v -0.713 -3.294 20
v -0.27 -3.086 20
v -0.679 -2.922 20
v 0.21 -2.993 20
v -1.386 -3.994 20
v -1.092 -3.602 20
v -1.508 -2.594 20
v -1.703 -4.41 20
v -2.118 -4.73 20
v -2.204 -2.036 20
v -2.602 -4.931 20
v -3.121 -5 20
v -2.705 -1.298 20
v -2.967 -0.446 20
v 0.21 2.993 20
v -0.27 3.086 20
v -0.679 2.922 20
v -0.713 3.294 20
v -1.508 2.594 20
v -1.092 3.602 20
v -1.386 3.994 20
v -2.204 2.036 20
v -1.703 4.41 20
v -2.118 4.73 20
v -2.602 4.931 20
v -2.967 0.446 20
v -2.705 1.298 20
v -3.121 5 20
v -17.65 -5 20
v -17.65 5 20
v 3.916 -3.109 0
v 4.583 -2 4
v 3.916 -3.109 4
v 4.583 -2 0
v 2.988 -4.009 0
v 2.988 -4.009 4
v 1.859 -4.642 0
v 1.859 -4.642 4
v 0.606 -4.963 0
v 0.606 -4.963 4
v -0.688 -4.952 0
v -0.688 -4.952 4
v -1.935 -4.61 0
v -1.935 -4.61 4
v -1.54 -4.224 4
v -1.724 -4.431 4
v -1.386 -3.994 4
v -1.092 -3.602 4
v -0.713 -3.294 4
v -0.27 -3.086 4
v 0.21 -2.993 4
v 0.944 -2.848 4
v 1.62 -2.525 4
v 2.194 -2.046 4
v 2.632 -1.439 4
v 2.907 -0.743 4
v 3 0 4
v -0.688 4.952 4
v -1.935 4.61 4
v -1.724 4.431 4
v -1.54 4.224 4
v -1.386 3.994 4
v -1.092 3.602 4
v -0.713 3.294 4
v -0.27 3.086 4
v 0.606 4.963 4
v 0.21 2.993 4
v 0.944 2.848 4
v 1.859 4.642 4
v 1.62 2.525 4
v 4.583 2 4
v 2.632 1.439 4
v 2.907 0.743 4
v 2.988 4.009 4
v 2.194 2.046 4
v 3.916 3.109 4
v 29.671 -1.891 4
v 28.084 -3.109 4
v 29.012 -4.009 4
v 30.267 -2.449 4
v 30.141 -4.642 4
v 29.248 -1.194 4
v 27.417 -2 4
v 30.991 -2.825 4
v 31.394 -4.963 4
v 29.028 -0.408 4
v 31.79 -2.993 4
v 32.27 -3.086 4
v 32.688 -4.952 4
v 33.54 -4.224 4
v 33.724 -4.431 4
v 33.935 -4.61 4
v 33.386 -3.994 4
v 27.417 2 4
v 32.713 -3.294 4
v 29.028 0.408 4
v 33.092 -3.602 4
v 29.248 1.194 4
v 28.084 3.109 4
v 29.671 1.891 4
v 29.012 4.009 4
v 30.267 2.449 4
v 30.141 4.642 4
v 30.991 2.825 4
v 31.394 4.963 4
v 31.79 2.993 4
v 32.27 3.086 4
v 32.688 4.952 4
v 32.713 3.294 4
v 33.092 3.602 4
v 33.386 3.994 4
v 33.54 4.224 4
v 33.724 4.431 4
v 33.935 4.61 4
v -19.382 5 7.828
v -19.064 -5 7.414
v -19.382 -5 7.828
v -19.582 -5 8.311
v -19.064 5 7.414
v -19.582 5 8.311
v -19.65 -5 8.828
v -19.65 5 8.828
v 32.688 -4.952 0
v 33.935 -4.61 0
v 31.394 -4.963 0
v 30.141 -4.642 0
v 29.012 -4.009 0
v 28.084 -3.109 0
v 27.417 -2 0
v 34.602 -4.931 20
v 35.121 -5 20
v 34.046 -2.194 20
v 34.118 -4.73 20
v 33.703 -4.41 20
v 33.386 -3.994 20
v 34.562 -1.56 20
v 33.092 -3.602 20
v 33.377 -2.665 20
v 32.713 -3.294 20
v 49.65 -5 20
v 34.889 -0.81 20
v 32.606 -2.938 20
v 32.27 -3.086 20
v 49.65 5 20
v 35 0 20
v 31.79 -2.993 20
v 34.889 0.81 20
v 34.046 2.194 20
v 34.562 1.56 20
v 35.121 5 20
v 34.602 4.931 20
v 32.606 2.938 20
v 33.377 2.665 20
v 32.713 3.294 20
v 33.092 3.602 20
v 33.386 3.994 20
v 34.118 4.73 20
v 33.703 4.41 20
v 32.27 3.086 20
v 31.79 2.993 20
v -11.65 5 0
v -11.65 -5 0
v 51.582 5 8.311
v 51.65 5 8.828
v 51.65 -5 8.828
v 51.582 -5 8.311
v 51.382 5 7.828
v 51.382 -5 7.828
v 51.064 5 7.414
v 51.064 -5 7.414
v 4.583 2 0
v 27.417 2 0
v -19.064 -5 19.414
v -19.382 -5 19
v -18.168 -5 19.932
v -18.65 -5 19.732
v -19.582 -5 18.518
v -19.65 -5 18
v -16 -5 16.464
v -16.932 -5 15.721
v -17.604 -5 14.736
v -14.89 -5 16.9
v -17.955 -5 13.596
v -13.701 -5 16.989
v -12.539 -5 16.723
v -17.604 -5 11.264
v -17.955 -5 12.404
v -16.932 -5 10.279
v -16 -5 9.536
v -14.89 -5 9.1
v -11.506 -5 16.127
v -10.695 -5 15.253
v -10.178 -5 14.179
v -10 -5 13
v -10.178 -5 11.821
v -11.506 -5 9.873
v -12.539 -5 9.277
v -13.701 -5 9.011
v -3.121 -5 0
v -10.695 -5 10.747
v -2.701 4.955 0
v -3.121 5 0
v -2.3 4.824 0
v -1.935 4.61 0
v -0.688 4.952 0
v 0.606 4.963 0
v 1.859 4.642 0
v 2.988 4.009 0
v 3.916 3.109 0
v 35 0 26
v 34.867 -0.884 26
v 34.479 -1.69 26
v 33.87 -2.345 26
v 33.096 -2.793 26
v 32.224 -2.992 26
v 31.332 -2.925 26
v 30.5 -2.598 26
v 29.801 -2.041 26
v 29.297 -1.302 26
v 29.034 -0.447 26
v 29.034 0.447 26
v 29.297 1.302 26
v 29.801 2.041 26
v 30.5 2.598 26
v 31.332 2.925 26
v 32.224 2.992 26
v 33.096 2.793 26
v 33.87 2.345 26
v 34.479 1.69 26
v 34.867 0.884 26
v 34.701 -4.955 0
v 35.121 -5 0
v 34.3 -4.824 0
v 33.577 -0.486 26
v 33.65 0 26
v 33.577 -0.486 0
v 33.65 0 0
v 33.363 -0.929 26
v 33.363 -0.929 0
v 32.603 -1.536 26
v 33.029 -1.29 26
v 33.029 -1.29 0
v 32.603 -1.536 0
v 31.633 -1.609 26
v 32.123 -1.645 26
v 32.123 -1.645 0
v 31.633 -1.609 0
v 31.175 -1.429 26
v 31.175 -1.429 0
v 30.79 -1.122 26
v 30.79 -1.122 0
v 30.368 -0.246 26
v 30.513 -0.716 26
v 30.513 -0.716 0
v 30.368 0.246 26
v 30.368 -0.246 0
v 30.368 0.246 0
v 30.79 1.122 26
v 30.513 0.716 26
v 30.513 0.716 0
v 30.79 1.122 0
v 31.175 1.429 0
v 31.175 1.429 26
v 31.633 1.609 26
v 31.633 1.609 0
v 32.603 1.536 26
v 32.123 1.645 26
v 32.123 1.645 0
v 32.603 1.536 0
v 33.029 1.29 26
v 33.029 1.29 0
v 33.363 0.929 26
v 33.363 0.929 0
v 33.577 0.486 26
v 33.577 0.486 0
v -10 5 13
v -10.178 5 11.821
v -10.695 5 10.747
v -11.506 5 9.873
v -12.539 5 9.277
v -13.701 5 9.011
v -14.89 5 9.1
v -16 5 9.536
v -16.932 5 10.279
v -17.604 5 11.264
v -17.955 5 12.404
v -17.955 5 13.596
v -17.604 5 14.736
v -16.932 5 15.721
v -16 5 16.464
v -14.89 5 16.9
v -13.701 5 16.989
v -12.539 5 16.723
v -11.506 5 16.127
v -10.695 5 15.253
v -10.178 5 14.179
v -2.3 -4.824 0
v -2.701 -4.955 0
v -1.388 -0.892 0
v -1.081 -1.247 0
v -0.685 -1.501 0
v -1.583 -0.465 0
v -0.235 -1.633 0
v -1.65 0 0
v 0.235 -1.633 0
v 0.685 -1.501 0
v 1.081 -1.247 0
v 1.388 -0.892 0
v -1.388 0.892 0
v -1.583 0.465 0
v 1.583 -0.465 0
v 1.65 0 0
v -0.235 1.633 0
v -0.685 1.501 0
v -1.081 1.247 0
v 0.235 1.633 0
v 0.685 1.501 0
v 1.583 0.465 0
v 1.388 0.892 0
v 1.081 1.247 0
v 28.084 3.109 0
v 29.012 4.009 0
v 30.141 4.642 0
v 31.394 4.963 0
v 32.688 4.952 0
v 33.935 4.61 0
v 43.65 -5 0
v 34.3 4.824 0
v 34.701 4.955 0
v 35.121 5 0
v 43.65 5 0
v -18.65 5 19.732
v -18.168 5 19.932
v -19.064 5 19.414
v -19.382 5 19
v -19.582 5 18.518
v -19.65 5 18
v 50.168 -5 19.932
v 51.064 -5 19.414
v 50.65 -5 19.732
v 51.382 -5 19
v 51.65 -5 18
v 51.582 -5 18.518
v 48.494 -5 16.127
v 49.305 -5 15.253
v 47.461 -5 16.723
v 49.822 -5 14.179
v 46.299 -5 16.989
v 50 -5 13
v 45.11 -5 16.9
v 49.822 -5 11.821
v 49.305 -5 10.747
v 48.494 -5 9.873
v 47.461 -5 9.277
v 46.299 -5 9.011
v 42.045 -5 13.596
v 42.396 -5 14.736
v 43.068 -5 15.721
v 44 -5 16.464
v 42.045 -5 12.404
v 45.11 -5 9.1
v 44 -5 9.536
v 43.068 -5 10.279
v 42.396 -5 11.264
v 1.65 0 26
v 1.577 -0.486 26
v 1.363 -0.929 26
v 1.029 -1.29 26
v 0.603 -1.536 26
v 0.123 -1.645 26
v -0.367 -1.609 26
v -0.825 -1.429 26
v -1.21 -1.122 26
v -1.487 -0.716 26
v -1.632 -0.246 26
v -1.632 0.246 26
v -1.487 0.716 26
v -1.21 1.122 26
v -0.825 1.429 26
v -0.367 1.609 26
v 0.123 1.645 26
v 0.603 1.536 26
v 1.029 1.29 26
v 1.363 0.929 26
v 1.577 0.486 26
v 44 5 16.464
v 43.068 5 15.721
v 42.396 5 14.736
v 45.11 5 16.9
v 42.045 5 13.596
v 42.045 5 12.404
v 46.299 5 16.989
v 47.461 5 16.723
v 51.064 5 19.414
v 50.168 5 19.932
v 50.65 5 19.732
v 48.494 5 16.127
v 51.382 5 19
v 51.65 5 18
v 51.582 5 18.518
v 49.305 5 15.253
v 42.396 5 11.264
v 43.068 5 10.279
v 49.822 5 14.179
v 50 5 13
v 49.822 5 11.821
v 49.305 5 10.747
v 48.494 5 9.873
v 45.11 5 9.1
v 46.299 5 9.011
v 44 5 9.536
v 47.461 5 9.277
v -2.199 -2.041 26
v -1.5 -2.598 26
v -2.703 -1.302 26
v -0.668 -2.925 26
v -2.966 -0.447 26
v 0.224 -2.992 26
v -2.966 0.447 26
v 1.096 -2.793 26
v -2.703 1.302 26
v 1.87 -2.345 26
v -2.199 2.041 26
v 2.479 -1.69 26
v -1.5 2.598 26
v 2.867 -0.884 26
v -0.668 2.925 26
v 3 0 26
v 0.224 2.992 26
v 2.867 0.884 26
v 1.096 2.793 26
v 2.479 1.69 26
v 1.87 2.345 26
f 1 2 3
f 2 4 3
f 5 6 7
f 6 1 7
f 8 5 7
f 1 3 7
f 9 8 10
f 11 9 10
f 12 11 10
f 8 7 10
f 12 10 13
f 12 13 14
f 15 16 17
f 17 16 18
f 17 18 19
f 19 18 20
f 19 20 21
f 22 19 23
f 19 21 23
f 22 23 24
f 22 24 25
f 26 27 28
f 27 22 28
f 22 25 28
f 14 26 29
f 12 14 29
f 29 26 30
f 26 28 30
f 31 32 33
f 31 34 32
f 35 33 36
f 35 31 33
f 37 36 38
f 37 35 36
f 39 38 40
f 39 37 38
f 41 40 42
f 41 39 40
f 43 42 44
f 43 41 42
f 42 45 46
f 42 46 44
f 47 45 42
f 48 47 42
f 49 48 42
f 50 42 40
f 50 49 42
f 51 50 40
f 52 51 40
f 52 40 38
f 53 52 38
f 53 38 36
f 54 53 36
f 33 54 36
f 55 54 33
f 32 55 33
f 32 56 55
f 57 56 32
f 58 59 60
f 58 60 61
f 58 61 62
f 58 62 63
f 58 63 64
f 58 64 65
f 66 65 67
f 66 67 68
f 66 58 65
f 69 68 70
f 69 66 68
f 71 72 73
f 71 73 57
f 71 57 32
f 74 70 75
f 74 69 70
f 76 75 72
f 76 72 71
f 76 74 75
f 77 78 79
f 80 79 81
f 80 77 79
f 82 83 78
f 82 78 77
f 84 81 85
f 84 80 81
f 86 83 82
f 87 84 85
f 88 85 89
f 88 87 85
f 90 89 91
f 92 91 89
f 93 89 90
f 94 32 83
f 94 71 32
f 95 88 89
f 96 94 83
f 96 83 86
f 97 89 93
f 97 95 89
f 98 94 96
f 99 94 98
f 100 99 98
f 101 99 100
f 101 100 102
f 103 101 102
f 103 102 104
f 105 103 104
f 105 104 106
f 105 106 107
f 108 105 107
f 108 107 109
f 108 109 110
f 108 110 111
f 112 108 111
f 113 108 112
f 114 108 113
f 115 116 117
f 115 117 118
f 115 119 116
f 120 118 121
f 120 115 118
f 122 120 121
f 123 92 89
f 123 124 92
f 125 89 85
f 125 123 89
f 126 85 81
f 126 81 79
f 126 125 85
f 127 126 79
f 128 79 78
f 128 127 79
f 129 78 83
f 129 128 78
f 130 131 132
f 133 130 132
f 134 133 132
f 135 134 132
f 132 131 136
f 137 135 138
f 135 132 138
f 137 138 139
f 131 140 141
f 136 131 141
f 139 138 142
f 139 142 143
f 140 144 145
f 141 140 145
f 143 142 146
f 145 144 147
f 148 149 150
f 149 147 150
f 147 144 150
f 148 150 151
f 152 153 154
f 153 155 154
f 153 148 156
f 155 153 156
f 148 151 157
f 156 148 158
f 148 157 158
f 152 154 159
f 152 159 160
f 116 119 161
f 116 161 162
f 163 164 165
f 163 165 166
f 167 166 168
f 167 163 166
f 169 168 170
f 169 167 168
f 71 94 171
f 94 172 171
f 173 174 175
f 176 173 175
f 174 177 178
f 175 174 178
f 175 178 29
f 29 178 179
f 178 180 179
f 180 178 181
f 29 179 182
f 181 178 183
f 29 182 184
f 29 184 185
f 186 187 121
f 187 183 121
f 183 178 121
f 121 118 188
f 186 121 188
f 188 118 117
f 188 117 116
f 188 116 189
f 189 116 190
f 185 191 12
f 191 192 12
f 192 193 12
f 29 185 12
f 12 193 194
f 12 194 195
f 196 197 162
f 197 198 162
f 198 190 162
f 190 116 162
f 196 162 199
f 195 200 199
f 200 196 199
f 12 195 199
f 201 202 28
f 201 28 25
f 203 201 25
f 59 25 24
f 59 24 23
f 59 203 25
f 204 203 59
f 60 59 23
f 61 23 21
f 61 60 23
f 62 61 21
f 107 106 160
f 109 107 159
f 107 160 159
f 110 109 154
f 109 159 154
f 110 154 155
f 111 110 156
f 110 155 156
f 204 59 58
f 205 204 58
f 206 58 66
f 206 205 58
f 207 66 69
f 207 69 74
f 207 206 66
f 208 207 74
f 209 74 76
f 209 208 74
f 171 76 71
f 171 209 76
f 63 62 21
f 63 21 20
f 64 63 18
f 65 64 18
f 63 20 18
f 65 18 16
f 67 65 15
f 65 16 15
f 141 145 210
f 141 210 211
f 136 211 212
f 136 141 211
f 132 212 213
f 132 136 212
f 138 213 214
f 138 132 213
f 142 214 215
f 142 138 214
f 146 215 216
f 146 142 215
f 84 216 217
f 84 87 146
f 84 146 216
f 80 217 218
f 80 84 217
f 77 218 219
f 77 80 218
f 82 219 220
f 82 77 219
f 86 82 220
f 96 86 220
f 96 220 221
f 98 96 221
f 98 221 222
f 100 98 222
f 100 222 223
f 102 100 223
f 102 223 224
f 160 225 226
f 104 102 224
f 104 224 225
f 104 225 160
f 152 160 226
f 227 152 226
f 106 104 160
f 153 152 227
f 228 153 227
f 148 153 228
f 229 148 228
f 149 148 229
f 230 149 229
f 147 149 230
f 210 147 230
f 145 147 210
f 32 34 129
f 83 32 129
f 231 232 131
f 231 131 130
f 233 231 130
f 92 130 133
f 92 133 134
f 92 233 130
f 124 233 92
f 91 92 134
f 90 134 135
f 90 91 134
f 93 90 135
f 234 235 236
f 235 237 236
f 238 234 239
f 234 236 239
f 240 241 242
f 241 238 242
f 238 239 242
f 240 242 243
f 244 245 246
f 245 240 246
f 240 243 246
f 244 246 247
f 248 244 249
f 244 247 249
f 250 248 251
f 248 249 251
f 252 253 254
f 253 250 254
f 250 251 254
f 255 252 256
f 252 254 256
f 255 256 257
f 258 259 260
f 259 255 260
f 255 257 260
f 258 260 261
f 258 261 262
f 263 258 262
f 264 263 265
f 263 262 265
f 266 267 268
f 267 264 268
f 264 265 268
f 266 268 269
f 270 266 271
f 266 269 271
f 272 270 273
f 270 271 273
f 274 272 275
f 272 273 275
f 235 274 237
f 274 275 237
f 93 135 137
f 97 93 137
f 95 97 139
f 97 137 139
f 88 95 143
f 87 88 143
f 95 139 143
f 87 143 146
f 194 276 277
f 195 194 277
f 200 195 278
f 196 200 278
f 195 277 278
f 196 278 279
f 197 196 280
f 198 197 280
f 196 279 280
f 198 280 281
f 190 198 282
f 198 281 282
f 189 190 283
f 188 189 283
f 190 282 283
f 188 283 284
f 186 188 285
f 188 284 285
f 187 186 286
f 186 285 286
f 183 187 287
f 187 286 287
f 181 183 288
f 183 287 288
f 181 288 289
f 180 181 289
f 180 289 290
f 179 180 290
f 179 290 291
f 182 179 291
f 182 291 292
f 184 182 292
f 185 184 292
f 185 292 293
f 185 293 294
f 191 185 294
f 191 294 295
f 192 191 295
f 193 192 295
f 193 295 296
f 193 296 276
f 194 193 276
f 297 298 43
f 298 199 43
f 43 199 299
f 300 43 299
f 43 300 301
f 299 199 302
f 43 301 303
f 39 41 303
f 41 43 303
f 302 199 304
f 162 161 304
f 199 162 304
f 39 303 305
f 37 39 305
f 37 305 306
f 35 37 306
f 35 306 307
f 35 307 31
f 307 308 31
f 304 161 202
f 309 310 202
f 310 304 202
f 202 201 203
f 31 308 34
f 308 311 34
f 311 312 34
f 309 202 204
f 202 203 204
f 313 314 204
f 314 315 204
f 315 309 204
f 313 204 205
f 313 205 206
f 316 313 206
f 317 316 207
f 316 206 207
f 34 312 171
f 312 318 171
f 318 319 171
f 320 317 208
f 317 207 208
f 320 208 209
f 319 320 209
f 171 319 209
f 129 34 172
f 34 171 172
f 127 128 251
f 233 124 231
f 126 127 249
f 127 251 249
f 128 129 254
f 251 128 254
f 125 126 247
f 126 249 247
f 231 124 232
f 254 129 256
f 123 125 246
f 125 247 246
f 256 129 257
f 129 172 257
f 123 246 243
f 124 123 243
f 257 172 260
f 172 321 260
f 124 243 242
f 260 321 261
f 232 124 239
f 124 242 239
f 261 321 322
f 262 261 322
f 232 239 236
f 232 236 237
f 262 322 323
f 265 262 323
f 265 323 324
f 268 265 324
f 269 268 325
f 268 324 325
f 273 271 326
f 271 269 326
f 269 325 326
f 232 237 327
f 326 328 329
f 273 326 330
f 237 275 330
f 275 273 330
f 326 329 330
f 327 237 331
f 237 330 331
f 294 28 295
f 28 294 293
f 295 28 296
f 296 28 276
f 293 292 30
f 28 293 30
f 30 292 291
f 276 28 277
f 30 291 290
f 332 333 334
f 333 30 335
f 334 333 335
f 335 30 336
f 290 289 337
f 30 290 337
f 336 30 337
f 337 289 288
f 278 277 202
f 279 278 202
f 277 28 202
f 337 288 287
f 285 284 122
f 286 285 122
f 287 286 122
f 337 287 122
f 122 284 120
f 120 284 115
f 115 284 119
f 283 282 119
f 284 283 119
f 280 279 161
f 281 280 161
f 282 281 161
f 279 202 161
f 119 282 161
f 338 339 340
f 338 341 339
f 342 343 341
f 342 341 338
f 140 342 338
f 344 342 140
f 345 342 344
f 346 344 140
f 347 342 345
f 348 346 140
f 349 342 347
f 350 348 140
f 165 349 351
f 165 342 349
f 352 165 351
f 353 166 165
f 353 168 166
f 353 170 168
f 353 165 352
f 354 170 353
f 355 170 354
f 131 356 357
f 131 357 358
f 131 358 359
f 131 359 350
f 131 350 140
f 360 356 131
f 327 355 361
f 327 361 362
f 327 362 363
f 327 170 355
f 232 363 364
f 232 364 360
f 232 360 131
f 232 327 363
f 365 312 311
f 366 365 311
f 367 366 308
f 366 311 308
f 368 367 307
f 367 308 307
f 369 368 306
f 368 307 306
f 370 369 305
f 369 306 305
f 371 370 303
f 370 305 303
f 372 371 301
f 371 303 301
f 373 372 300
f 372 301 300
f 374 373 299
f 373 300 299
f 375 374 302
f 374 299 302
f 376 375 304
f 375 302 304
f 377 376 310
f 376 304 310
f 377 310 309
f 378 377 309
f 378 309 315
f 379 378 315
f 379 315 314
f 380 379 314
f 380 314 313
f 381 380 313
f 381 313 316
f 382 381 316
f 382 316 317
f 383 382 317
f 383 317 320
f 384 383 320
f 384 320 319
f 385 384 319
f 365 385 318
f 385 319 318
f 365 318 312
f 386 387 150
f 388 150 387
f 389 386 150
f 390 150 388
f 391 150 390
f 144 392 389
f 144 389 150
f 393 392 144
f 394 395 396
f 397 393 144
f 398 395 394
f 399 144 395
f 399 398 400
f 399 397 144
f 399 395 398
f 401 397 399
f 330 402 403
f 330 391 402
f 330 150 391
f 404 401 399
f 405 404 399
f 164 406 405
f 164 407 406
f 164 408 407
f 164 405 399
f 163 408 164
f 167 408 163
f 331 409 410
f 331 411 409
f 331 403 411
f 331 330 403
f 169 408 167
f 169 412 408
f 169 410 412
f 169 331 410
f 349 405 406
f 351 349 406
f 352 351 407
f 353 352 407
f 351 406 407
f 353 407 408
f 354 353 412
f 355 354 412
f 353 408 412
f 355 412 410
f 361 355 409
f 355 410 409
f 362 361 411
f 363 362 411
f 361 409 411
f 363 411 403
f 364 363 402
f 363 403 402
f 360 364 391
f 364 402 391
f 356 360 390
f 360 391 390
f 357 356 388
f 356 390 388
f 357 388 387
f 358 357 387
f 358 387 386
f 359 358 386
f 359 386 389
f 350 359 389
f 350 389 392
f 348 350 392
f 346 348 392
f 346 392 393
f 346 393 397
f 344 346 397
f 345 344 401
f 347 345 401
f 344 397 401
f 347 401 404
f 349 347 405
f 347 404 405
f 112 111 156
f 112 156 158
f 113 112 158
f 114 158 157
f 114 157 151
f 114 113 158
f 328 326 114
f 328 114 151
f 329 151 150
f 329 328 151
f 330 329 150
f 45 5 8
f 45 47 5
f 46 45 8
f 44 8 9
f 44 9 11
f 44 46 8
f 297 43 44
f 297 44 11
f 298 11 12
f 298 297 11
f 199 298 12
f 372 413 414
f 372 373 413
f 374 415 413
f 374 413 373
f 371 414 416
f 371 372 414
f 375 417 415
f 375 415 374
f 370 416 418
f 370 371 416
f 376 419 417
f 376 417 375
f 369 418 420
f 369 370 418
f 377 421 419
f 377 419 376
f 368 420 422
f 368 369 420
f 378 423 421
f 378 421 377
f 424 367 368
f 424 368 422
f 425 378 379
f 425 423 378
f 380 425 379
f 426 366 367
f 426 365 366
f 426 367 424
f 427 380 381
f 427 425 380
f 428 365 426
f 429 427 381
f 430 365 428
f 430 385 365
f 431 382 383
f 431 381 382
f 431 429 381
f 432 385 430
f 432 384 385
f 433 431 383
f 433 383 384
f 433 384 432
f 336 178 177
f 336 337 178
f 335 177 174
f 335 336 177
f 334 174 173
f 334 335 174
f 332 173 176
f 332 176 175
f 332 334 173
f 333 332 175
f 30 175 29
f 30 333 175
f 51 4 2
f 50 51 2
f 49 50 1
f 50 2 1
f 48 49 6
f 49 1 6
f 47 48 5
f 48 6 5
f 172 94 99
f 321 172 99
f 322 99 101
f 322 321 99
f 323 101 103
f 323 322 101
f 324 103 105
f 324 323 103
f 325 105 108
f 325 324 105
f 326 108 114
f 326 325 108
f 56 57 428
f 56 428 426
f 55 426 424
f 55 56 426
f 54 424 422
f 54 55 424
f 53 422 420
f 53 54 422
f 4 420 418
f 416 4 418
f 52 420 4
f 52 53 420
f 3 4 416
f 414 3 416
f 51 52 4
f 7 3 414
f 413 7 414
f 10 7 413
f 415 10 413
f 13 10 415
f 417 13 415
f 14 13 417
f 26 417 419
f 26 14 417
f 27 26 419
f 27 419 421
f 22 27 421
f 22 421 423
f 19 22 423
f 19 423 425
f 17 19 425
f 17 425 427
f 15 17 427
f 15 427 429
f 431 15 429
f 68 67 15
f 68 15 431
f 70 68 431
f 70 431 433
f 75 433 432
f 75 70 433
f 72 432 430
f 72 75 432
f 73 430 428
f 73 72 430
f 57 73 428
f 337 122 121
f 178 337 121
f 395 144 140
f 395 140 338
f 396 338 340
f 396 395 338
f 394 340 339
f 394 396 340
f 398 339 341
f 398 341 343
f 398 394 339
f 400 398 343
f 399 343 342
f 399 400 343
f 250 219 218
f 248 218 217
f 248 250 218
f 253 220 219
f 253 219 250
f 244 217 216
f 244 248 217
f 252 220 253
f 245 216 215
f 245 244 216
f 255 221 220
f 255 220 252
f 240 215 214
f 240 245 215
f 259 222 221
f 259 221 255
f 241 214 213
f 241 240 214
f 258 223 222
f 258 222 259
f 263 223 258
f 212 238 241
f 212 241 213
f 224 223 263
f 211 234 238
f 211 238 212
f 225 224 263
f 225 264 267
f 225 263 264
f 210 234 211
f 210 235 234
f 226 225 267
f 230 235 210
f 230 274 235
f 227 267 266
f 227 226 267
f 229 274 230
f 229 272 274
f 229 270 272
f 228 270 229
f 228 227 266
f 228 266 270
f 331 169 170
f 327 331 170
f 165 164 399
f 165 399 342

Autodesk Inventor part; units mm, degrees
ref_plane "YZ Plane" through (0, 0, 0) normal (1, 0, 0) x (0, 1, 0)
ref_plane "XZ Plane" through (0, 0, 0) normal (0, 1, 0) x (-1, 0, 0)
ref_plane "XY Plane" through (0, 0, 0) normal (0, 0, 1) x (1, 0, 0)
sketch "Sketch1" plane through (0, 0, 0) normal (0, 0, 1) x (1, 0, 0)
  circle A0 centre (0, 0) radius 1.65
  circle A1 centre (0, 0) radius 3
  circle A2 centre (32, 0) radius 1.65
  circle A3 centre (32, 0) radius 3
  dimension "d0" = 3.3
  dimension "d1" = 6
  dimension "d22" = 32
extrude "Extrusion1" add sketch "Sketch1" along normal blind 26
sketch "Sketch2" plane through (0, 0, 0) normal (0, 0, -1) x (-1, 0, 0)
  circle A0 centre (0, 0) radius 3 projected
  circle A1 centre (0, 0) radius 5
  circle A2 centre (-32, 0) radius 1.65 projected
  circle A3 centre (-32, 0) radius 5
  circle A4 centre (0, 0) radius 1.65 construction
  line L0 (-30.35, 2) -> (-1.65, 2)
  line L1 (-1.65, 2) -> (-1.65, -2)
  line L2 (-1.65, -2) -> (-30.35, -2)
  line L3 (-30.35, -2) -> (-30.35, 2)
  point P0 (-1.65, 0)
  dimension "d4" = 10
  dimension "d7" = 4
extrude "Extrusion2" add sketch "Sketch2" against normal blind 4 contours A0 L0 A1 L2 | L0 L1 L2 A0 | A0 L2 A1 L0 | A1 L2 A3 L0 | L0 L3 L2 A3 | A3 L2 L3 L0 picked at (-2.1, 0)
sketch "Sketch3" plane through (0, 0, 0) normal (0, 0, -1) x (-1, 0, 0)
  line L0 (-51.65, -5) -> (-33.65, -5)
  line L1 (-33.65, -5) -> (-33.65, 5)
  line L2 (-33.65, 5) -> (-51.65, 5)
  line L3 (-51.65, 5) -> (-51.65, -5)
  line L4 (1.65, 5) -> (19.65, 5)
  line L5 (19.65, 5) -> (19.65, -5)
  line L6 (19.65, -5) -> (1.65, -5)
  line L7 (1.65, -5) -> (1.65, 5)
  circle A0 centre (0, 0) radius 1.65 construction
  circle A1 centre (-32, 0) radius 1.65 construction
  arc A2 (-27.4174, 2) -> (-27.4174, -2) centre (-32, 0) ccw construction
  arc A3 (-4.5826, -2) -> (-4.5826, 2) centre (0, 0) ccw construction
  point P0 (-33.65, 0)
  point P1 (1.65, 0)
  dimension "d8" = 18
  dimension "d10" = 18
extrude "Extrusion3" add sketch "Sketch3" against normal blind 20
sketch "Sketch4" plane through (33.65, 5, 0) normal (0, 1, 0) x (1, 0, 0)
  circle A0 centre (-47.65, -13) radius 4
  circle A1 centre (12.35, -13) radius 4
  line L0 (-35.3, -20) -> (-53.3, -20) projected
  line L1 (18, -20) -> (0, -20) projected
  line L2 (-35.3, 0) -> (-53.3, 0) projected
  line L3 (18, 0) -> (18, -20) projected
  line L4 (-53.3, 0) -> (-53.3, -20) projected
  point P0 (-33.65, 0)
  point P1 (-44.3, -20)
  point P2 (9, -20)
  dimension "d13" = 8
  dimension "d14" = 8
  dimension "d15" = 13
  dimension "d23" = 60
  dimension "d24" = 5.65
  dimension "d25" = 5.65
extrude "Extrusion4" cut sketch "Sketch4" against normal blind 20
chamfer "Chamfer1" distance 8 angle 45 2 edges at (51.65, 0, 0) (-19.65, 0, 0)
fillet "Fillet1" radius 2 12 edges at (33.65, 2.5055, 12) (33.65, -2.5055, 12) (33.65, 5, 10) (-1.65, 2.5055, 12) (-1.65, -2.5055, 12) (-1.65, 5, 10) (-1.65, -5, 10) (33.65, -5, 10) (51.65, 0, 20) (51.65, 0, 8) (-19.65, 0, 8) (-19.65, 0, 20)
equation "\"d10\" = d8"
equation "\"d24\" = d25"
properties part number "spacer stepperM n rail"
